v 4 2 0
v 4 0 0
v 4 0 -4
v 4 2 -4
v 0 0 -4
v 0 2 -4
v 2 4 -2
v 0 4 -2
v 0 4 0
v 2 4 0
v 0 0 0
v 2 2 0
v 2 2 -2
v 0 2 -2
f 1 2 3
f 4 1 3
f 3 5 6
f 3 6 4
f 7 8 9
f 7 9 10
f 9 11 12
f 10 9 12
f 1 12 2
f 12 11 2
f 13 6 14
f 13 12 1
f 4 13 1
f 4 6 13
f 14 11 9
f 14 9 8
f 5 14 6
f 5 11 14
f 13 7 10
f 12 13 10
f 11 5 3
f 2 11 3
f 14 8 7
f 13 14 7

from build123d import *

# Parameters (mm, degrees)
SKETCH1_W           = 4
SKETCH1_H           = 4
BOSS_EXTRUDE1_DEPTH = 4
CUT_EXTRUDE1_DEPTH  = 2


with BuildPart() as part:
    # Sketch1 → Boss-Extrude1 (new body)
    with BuildSketch(Plane(origin=(0, 0, 0), x_dir=(1, 0, 0), z_dir=(0, 1, 0))):
        with Locations((2, 2)):
            Rectangle(SKETCH1_W, SKETCH1_H)
    extrude(amount=BOSS_EXTRUDE1_DEPTH)

    # Sketch2 → Cut-Extrude1 (cut)
    with BuildSketch(Plane(origin=(0, 4, 0), x_dir=(1, 0, 0), z_dir=(0, 1, 0))):
        Polygon((0, 4), (0, 2), (2, 2), (2, 0), (4, 0), (4, 4), align=None)
    extrude(amount=-CUT_EXTRUDE1_DEPTH, mode=Mode.SUBTRACT)


solid = part.part
